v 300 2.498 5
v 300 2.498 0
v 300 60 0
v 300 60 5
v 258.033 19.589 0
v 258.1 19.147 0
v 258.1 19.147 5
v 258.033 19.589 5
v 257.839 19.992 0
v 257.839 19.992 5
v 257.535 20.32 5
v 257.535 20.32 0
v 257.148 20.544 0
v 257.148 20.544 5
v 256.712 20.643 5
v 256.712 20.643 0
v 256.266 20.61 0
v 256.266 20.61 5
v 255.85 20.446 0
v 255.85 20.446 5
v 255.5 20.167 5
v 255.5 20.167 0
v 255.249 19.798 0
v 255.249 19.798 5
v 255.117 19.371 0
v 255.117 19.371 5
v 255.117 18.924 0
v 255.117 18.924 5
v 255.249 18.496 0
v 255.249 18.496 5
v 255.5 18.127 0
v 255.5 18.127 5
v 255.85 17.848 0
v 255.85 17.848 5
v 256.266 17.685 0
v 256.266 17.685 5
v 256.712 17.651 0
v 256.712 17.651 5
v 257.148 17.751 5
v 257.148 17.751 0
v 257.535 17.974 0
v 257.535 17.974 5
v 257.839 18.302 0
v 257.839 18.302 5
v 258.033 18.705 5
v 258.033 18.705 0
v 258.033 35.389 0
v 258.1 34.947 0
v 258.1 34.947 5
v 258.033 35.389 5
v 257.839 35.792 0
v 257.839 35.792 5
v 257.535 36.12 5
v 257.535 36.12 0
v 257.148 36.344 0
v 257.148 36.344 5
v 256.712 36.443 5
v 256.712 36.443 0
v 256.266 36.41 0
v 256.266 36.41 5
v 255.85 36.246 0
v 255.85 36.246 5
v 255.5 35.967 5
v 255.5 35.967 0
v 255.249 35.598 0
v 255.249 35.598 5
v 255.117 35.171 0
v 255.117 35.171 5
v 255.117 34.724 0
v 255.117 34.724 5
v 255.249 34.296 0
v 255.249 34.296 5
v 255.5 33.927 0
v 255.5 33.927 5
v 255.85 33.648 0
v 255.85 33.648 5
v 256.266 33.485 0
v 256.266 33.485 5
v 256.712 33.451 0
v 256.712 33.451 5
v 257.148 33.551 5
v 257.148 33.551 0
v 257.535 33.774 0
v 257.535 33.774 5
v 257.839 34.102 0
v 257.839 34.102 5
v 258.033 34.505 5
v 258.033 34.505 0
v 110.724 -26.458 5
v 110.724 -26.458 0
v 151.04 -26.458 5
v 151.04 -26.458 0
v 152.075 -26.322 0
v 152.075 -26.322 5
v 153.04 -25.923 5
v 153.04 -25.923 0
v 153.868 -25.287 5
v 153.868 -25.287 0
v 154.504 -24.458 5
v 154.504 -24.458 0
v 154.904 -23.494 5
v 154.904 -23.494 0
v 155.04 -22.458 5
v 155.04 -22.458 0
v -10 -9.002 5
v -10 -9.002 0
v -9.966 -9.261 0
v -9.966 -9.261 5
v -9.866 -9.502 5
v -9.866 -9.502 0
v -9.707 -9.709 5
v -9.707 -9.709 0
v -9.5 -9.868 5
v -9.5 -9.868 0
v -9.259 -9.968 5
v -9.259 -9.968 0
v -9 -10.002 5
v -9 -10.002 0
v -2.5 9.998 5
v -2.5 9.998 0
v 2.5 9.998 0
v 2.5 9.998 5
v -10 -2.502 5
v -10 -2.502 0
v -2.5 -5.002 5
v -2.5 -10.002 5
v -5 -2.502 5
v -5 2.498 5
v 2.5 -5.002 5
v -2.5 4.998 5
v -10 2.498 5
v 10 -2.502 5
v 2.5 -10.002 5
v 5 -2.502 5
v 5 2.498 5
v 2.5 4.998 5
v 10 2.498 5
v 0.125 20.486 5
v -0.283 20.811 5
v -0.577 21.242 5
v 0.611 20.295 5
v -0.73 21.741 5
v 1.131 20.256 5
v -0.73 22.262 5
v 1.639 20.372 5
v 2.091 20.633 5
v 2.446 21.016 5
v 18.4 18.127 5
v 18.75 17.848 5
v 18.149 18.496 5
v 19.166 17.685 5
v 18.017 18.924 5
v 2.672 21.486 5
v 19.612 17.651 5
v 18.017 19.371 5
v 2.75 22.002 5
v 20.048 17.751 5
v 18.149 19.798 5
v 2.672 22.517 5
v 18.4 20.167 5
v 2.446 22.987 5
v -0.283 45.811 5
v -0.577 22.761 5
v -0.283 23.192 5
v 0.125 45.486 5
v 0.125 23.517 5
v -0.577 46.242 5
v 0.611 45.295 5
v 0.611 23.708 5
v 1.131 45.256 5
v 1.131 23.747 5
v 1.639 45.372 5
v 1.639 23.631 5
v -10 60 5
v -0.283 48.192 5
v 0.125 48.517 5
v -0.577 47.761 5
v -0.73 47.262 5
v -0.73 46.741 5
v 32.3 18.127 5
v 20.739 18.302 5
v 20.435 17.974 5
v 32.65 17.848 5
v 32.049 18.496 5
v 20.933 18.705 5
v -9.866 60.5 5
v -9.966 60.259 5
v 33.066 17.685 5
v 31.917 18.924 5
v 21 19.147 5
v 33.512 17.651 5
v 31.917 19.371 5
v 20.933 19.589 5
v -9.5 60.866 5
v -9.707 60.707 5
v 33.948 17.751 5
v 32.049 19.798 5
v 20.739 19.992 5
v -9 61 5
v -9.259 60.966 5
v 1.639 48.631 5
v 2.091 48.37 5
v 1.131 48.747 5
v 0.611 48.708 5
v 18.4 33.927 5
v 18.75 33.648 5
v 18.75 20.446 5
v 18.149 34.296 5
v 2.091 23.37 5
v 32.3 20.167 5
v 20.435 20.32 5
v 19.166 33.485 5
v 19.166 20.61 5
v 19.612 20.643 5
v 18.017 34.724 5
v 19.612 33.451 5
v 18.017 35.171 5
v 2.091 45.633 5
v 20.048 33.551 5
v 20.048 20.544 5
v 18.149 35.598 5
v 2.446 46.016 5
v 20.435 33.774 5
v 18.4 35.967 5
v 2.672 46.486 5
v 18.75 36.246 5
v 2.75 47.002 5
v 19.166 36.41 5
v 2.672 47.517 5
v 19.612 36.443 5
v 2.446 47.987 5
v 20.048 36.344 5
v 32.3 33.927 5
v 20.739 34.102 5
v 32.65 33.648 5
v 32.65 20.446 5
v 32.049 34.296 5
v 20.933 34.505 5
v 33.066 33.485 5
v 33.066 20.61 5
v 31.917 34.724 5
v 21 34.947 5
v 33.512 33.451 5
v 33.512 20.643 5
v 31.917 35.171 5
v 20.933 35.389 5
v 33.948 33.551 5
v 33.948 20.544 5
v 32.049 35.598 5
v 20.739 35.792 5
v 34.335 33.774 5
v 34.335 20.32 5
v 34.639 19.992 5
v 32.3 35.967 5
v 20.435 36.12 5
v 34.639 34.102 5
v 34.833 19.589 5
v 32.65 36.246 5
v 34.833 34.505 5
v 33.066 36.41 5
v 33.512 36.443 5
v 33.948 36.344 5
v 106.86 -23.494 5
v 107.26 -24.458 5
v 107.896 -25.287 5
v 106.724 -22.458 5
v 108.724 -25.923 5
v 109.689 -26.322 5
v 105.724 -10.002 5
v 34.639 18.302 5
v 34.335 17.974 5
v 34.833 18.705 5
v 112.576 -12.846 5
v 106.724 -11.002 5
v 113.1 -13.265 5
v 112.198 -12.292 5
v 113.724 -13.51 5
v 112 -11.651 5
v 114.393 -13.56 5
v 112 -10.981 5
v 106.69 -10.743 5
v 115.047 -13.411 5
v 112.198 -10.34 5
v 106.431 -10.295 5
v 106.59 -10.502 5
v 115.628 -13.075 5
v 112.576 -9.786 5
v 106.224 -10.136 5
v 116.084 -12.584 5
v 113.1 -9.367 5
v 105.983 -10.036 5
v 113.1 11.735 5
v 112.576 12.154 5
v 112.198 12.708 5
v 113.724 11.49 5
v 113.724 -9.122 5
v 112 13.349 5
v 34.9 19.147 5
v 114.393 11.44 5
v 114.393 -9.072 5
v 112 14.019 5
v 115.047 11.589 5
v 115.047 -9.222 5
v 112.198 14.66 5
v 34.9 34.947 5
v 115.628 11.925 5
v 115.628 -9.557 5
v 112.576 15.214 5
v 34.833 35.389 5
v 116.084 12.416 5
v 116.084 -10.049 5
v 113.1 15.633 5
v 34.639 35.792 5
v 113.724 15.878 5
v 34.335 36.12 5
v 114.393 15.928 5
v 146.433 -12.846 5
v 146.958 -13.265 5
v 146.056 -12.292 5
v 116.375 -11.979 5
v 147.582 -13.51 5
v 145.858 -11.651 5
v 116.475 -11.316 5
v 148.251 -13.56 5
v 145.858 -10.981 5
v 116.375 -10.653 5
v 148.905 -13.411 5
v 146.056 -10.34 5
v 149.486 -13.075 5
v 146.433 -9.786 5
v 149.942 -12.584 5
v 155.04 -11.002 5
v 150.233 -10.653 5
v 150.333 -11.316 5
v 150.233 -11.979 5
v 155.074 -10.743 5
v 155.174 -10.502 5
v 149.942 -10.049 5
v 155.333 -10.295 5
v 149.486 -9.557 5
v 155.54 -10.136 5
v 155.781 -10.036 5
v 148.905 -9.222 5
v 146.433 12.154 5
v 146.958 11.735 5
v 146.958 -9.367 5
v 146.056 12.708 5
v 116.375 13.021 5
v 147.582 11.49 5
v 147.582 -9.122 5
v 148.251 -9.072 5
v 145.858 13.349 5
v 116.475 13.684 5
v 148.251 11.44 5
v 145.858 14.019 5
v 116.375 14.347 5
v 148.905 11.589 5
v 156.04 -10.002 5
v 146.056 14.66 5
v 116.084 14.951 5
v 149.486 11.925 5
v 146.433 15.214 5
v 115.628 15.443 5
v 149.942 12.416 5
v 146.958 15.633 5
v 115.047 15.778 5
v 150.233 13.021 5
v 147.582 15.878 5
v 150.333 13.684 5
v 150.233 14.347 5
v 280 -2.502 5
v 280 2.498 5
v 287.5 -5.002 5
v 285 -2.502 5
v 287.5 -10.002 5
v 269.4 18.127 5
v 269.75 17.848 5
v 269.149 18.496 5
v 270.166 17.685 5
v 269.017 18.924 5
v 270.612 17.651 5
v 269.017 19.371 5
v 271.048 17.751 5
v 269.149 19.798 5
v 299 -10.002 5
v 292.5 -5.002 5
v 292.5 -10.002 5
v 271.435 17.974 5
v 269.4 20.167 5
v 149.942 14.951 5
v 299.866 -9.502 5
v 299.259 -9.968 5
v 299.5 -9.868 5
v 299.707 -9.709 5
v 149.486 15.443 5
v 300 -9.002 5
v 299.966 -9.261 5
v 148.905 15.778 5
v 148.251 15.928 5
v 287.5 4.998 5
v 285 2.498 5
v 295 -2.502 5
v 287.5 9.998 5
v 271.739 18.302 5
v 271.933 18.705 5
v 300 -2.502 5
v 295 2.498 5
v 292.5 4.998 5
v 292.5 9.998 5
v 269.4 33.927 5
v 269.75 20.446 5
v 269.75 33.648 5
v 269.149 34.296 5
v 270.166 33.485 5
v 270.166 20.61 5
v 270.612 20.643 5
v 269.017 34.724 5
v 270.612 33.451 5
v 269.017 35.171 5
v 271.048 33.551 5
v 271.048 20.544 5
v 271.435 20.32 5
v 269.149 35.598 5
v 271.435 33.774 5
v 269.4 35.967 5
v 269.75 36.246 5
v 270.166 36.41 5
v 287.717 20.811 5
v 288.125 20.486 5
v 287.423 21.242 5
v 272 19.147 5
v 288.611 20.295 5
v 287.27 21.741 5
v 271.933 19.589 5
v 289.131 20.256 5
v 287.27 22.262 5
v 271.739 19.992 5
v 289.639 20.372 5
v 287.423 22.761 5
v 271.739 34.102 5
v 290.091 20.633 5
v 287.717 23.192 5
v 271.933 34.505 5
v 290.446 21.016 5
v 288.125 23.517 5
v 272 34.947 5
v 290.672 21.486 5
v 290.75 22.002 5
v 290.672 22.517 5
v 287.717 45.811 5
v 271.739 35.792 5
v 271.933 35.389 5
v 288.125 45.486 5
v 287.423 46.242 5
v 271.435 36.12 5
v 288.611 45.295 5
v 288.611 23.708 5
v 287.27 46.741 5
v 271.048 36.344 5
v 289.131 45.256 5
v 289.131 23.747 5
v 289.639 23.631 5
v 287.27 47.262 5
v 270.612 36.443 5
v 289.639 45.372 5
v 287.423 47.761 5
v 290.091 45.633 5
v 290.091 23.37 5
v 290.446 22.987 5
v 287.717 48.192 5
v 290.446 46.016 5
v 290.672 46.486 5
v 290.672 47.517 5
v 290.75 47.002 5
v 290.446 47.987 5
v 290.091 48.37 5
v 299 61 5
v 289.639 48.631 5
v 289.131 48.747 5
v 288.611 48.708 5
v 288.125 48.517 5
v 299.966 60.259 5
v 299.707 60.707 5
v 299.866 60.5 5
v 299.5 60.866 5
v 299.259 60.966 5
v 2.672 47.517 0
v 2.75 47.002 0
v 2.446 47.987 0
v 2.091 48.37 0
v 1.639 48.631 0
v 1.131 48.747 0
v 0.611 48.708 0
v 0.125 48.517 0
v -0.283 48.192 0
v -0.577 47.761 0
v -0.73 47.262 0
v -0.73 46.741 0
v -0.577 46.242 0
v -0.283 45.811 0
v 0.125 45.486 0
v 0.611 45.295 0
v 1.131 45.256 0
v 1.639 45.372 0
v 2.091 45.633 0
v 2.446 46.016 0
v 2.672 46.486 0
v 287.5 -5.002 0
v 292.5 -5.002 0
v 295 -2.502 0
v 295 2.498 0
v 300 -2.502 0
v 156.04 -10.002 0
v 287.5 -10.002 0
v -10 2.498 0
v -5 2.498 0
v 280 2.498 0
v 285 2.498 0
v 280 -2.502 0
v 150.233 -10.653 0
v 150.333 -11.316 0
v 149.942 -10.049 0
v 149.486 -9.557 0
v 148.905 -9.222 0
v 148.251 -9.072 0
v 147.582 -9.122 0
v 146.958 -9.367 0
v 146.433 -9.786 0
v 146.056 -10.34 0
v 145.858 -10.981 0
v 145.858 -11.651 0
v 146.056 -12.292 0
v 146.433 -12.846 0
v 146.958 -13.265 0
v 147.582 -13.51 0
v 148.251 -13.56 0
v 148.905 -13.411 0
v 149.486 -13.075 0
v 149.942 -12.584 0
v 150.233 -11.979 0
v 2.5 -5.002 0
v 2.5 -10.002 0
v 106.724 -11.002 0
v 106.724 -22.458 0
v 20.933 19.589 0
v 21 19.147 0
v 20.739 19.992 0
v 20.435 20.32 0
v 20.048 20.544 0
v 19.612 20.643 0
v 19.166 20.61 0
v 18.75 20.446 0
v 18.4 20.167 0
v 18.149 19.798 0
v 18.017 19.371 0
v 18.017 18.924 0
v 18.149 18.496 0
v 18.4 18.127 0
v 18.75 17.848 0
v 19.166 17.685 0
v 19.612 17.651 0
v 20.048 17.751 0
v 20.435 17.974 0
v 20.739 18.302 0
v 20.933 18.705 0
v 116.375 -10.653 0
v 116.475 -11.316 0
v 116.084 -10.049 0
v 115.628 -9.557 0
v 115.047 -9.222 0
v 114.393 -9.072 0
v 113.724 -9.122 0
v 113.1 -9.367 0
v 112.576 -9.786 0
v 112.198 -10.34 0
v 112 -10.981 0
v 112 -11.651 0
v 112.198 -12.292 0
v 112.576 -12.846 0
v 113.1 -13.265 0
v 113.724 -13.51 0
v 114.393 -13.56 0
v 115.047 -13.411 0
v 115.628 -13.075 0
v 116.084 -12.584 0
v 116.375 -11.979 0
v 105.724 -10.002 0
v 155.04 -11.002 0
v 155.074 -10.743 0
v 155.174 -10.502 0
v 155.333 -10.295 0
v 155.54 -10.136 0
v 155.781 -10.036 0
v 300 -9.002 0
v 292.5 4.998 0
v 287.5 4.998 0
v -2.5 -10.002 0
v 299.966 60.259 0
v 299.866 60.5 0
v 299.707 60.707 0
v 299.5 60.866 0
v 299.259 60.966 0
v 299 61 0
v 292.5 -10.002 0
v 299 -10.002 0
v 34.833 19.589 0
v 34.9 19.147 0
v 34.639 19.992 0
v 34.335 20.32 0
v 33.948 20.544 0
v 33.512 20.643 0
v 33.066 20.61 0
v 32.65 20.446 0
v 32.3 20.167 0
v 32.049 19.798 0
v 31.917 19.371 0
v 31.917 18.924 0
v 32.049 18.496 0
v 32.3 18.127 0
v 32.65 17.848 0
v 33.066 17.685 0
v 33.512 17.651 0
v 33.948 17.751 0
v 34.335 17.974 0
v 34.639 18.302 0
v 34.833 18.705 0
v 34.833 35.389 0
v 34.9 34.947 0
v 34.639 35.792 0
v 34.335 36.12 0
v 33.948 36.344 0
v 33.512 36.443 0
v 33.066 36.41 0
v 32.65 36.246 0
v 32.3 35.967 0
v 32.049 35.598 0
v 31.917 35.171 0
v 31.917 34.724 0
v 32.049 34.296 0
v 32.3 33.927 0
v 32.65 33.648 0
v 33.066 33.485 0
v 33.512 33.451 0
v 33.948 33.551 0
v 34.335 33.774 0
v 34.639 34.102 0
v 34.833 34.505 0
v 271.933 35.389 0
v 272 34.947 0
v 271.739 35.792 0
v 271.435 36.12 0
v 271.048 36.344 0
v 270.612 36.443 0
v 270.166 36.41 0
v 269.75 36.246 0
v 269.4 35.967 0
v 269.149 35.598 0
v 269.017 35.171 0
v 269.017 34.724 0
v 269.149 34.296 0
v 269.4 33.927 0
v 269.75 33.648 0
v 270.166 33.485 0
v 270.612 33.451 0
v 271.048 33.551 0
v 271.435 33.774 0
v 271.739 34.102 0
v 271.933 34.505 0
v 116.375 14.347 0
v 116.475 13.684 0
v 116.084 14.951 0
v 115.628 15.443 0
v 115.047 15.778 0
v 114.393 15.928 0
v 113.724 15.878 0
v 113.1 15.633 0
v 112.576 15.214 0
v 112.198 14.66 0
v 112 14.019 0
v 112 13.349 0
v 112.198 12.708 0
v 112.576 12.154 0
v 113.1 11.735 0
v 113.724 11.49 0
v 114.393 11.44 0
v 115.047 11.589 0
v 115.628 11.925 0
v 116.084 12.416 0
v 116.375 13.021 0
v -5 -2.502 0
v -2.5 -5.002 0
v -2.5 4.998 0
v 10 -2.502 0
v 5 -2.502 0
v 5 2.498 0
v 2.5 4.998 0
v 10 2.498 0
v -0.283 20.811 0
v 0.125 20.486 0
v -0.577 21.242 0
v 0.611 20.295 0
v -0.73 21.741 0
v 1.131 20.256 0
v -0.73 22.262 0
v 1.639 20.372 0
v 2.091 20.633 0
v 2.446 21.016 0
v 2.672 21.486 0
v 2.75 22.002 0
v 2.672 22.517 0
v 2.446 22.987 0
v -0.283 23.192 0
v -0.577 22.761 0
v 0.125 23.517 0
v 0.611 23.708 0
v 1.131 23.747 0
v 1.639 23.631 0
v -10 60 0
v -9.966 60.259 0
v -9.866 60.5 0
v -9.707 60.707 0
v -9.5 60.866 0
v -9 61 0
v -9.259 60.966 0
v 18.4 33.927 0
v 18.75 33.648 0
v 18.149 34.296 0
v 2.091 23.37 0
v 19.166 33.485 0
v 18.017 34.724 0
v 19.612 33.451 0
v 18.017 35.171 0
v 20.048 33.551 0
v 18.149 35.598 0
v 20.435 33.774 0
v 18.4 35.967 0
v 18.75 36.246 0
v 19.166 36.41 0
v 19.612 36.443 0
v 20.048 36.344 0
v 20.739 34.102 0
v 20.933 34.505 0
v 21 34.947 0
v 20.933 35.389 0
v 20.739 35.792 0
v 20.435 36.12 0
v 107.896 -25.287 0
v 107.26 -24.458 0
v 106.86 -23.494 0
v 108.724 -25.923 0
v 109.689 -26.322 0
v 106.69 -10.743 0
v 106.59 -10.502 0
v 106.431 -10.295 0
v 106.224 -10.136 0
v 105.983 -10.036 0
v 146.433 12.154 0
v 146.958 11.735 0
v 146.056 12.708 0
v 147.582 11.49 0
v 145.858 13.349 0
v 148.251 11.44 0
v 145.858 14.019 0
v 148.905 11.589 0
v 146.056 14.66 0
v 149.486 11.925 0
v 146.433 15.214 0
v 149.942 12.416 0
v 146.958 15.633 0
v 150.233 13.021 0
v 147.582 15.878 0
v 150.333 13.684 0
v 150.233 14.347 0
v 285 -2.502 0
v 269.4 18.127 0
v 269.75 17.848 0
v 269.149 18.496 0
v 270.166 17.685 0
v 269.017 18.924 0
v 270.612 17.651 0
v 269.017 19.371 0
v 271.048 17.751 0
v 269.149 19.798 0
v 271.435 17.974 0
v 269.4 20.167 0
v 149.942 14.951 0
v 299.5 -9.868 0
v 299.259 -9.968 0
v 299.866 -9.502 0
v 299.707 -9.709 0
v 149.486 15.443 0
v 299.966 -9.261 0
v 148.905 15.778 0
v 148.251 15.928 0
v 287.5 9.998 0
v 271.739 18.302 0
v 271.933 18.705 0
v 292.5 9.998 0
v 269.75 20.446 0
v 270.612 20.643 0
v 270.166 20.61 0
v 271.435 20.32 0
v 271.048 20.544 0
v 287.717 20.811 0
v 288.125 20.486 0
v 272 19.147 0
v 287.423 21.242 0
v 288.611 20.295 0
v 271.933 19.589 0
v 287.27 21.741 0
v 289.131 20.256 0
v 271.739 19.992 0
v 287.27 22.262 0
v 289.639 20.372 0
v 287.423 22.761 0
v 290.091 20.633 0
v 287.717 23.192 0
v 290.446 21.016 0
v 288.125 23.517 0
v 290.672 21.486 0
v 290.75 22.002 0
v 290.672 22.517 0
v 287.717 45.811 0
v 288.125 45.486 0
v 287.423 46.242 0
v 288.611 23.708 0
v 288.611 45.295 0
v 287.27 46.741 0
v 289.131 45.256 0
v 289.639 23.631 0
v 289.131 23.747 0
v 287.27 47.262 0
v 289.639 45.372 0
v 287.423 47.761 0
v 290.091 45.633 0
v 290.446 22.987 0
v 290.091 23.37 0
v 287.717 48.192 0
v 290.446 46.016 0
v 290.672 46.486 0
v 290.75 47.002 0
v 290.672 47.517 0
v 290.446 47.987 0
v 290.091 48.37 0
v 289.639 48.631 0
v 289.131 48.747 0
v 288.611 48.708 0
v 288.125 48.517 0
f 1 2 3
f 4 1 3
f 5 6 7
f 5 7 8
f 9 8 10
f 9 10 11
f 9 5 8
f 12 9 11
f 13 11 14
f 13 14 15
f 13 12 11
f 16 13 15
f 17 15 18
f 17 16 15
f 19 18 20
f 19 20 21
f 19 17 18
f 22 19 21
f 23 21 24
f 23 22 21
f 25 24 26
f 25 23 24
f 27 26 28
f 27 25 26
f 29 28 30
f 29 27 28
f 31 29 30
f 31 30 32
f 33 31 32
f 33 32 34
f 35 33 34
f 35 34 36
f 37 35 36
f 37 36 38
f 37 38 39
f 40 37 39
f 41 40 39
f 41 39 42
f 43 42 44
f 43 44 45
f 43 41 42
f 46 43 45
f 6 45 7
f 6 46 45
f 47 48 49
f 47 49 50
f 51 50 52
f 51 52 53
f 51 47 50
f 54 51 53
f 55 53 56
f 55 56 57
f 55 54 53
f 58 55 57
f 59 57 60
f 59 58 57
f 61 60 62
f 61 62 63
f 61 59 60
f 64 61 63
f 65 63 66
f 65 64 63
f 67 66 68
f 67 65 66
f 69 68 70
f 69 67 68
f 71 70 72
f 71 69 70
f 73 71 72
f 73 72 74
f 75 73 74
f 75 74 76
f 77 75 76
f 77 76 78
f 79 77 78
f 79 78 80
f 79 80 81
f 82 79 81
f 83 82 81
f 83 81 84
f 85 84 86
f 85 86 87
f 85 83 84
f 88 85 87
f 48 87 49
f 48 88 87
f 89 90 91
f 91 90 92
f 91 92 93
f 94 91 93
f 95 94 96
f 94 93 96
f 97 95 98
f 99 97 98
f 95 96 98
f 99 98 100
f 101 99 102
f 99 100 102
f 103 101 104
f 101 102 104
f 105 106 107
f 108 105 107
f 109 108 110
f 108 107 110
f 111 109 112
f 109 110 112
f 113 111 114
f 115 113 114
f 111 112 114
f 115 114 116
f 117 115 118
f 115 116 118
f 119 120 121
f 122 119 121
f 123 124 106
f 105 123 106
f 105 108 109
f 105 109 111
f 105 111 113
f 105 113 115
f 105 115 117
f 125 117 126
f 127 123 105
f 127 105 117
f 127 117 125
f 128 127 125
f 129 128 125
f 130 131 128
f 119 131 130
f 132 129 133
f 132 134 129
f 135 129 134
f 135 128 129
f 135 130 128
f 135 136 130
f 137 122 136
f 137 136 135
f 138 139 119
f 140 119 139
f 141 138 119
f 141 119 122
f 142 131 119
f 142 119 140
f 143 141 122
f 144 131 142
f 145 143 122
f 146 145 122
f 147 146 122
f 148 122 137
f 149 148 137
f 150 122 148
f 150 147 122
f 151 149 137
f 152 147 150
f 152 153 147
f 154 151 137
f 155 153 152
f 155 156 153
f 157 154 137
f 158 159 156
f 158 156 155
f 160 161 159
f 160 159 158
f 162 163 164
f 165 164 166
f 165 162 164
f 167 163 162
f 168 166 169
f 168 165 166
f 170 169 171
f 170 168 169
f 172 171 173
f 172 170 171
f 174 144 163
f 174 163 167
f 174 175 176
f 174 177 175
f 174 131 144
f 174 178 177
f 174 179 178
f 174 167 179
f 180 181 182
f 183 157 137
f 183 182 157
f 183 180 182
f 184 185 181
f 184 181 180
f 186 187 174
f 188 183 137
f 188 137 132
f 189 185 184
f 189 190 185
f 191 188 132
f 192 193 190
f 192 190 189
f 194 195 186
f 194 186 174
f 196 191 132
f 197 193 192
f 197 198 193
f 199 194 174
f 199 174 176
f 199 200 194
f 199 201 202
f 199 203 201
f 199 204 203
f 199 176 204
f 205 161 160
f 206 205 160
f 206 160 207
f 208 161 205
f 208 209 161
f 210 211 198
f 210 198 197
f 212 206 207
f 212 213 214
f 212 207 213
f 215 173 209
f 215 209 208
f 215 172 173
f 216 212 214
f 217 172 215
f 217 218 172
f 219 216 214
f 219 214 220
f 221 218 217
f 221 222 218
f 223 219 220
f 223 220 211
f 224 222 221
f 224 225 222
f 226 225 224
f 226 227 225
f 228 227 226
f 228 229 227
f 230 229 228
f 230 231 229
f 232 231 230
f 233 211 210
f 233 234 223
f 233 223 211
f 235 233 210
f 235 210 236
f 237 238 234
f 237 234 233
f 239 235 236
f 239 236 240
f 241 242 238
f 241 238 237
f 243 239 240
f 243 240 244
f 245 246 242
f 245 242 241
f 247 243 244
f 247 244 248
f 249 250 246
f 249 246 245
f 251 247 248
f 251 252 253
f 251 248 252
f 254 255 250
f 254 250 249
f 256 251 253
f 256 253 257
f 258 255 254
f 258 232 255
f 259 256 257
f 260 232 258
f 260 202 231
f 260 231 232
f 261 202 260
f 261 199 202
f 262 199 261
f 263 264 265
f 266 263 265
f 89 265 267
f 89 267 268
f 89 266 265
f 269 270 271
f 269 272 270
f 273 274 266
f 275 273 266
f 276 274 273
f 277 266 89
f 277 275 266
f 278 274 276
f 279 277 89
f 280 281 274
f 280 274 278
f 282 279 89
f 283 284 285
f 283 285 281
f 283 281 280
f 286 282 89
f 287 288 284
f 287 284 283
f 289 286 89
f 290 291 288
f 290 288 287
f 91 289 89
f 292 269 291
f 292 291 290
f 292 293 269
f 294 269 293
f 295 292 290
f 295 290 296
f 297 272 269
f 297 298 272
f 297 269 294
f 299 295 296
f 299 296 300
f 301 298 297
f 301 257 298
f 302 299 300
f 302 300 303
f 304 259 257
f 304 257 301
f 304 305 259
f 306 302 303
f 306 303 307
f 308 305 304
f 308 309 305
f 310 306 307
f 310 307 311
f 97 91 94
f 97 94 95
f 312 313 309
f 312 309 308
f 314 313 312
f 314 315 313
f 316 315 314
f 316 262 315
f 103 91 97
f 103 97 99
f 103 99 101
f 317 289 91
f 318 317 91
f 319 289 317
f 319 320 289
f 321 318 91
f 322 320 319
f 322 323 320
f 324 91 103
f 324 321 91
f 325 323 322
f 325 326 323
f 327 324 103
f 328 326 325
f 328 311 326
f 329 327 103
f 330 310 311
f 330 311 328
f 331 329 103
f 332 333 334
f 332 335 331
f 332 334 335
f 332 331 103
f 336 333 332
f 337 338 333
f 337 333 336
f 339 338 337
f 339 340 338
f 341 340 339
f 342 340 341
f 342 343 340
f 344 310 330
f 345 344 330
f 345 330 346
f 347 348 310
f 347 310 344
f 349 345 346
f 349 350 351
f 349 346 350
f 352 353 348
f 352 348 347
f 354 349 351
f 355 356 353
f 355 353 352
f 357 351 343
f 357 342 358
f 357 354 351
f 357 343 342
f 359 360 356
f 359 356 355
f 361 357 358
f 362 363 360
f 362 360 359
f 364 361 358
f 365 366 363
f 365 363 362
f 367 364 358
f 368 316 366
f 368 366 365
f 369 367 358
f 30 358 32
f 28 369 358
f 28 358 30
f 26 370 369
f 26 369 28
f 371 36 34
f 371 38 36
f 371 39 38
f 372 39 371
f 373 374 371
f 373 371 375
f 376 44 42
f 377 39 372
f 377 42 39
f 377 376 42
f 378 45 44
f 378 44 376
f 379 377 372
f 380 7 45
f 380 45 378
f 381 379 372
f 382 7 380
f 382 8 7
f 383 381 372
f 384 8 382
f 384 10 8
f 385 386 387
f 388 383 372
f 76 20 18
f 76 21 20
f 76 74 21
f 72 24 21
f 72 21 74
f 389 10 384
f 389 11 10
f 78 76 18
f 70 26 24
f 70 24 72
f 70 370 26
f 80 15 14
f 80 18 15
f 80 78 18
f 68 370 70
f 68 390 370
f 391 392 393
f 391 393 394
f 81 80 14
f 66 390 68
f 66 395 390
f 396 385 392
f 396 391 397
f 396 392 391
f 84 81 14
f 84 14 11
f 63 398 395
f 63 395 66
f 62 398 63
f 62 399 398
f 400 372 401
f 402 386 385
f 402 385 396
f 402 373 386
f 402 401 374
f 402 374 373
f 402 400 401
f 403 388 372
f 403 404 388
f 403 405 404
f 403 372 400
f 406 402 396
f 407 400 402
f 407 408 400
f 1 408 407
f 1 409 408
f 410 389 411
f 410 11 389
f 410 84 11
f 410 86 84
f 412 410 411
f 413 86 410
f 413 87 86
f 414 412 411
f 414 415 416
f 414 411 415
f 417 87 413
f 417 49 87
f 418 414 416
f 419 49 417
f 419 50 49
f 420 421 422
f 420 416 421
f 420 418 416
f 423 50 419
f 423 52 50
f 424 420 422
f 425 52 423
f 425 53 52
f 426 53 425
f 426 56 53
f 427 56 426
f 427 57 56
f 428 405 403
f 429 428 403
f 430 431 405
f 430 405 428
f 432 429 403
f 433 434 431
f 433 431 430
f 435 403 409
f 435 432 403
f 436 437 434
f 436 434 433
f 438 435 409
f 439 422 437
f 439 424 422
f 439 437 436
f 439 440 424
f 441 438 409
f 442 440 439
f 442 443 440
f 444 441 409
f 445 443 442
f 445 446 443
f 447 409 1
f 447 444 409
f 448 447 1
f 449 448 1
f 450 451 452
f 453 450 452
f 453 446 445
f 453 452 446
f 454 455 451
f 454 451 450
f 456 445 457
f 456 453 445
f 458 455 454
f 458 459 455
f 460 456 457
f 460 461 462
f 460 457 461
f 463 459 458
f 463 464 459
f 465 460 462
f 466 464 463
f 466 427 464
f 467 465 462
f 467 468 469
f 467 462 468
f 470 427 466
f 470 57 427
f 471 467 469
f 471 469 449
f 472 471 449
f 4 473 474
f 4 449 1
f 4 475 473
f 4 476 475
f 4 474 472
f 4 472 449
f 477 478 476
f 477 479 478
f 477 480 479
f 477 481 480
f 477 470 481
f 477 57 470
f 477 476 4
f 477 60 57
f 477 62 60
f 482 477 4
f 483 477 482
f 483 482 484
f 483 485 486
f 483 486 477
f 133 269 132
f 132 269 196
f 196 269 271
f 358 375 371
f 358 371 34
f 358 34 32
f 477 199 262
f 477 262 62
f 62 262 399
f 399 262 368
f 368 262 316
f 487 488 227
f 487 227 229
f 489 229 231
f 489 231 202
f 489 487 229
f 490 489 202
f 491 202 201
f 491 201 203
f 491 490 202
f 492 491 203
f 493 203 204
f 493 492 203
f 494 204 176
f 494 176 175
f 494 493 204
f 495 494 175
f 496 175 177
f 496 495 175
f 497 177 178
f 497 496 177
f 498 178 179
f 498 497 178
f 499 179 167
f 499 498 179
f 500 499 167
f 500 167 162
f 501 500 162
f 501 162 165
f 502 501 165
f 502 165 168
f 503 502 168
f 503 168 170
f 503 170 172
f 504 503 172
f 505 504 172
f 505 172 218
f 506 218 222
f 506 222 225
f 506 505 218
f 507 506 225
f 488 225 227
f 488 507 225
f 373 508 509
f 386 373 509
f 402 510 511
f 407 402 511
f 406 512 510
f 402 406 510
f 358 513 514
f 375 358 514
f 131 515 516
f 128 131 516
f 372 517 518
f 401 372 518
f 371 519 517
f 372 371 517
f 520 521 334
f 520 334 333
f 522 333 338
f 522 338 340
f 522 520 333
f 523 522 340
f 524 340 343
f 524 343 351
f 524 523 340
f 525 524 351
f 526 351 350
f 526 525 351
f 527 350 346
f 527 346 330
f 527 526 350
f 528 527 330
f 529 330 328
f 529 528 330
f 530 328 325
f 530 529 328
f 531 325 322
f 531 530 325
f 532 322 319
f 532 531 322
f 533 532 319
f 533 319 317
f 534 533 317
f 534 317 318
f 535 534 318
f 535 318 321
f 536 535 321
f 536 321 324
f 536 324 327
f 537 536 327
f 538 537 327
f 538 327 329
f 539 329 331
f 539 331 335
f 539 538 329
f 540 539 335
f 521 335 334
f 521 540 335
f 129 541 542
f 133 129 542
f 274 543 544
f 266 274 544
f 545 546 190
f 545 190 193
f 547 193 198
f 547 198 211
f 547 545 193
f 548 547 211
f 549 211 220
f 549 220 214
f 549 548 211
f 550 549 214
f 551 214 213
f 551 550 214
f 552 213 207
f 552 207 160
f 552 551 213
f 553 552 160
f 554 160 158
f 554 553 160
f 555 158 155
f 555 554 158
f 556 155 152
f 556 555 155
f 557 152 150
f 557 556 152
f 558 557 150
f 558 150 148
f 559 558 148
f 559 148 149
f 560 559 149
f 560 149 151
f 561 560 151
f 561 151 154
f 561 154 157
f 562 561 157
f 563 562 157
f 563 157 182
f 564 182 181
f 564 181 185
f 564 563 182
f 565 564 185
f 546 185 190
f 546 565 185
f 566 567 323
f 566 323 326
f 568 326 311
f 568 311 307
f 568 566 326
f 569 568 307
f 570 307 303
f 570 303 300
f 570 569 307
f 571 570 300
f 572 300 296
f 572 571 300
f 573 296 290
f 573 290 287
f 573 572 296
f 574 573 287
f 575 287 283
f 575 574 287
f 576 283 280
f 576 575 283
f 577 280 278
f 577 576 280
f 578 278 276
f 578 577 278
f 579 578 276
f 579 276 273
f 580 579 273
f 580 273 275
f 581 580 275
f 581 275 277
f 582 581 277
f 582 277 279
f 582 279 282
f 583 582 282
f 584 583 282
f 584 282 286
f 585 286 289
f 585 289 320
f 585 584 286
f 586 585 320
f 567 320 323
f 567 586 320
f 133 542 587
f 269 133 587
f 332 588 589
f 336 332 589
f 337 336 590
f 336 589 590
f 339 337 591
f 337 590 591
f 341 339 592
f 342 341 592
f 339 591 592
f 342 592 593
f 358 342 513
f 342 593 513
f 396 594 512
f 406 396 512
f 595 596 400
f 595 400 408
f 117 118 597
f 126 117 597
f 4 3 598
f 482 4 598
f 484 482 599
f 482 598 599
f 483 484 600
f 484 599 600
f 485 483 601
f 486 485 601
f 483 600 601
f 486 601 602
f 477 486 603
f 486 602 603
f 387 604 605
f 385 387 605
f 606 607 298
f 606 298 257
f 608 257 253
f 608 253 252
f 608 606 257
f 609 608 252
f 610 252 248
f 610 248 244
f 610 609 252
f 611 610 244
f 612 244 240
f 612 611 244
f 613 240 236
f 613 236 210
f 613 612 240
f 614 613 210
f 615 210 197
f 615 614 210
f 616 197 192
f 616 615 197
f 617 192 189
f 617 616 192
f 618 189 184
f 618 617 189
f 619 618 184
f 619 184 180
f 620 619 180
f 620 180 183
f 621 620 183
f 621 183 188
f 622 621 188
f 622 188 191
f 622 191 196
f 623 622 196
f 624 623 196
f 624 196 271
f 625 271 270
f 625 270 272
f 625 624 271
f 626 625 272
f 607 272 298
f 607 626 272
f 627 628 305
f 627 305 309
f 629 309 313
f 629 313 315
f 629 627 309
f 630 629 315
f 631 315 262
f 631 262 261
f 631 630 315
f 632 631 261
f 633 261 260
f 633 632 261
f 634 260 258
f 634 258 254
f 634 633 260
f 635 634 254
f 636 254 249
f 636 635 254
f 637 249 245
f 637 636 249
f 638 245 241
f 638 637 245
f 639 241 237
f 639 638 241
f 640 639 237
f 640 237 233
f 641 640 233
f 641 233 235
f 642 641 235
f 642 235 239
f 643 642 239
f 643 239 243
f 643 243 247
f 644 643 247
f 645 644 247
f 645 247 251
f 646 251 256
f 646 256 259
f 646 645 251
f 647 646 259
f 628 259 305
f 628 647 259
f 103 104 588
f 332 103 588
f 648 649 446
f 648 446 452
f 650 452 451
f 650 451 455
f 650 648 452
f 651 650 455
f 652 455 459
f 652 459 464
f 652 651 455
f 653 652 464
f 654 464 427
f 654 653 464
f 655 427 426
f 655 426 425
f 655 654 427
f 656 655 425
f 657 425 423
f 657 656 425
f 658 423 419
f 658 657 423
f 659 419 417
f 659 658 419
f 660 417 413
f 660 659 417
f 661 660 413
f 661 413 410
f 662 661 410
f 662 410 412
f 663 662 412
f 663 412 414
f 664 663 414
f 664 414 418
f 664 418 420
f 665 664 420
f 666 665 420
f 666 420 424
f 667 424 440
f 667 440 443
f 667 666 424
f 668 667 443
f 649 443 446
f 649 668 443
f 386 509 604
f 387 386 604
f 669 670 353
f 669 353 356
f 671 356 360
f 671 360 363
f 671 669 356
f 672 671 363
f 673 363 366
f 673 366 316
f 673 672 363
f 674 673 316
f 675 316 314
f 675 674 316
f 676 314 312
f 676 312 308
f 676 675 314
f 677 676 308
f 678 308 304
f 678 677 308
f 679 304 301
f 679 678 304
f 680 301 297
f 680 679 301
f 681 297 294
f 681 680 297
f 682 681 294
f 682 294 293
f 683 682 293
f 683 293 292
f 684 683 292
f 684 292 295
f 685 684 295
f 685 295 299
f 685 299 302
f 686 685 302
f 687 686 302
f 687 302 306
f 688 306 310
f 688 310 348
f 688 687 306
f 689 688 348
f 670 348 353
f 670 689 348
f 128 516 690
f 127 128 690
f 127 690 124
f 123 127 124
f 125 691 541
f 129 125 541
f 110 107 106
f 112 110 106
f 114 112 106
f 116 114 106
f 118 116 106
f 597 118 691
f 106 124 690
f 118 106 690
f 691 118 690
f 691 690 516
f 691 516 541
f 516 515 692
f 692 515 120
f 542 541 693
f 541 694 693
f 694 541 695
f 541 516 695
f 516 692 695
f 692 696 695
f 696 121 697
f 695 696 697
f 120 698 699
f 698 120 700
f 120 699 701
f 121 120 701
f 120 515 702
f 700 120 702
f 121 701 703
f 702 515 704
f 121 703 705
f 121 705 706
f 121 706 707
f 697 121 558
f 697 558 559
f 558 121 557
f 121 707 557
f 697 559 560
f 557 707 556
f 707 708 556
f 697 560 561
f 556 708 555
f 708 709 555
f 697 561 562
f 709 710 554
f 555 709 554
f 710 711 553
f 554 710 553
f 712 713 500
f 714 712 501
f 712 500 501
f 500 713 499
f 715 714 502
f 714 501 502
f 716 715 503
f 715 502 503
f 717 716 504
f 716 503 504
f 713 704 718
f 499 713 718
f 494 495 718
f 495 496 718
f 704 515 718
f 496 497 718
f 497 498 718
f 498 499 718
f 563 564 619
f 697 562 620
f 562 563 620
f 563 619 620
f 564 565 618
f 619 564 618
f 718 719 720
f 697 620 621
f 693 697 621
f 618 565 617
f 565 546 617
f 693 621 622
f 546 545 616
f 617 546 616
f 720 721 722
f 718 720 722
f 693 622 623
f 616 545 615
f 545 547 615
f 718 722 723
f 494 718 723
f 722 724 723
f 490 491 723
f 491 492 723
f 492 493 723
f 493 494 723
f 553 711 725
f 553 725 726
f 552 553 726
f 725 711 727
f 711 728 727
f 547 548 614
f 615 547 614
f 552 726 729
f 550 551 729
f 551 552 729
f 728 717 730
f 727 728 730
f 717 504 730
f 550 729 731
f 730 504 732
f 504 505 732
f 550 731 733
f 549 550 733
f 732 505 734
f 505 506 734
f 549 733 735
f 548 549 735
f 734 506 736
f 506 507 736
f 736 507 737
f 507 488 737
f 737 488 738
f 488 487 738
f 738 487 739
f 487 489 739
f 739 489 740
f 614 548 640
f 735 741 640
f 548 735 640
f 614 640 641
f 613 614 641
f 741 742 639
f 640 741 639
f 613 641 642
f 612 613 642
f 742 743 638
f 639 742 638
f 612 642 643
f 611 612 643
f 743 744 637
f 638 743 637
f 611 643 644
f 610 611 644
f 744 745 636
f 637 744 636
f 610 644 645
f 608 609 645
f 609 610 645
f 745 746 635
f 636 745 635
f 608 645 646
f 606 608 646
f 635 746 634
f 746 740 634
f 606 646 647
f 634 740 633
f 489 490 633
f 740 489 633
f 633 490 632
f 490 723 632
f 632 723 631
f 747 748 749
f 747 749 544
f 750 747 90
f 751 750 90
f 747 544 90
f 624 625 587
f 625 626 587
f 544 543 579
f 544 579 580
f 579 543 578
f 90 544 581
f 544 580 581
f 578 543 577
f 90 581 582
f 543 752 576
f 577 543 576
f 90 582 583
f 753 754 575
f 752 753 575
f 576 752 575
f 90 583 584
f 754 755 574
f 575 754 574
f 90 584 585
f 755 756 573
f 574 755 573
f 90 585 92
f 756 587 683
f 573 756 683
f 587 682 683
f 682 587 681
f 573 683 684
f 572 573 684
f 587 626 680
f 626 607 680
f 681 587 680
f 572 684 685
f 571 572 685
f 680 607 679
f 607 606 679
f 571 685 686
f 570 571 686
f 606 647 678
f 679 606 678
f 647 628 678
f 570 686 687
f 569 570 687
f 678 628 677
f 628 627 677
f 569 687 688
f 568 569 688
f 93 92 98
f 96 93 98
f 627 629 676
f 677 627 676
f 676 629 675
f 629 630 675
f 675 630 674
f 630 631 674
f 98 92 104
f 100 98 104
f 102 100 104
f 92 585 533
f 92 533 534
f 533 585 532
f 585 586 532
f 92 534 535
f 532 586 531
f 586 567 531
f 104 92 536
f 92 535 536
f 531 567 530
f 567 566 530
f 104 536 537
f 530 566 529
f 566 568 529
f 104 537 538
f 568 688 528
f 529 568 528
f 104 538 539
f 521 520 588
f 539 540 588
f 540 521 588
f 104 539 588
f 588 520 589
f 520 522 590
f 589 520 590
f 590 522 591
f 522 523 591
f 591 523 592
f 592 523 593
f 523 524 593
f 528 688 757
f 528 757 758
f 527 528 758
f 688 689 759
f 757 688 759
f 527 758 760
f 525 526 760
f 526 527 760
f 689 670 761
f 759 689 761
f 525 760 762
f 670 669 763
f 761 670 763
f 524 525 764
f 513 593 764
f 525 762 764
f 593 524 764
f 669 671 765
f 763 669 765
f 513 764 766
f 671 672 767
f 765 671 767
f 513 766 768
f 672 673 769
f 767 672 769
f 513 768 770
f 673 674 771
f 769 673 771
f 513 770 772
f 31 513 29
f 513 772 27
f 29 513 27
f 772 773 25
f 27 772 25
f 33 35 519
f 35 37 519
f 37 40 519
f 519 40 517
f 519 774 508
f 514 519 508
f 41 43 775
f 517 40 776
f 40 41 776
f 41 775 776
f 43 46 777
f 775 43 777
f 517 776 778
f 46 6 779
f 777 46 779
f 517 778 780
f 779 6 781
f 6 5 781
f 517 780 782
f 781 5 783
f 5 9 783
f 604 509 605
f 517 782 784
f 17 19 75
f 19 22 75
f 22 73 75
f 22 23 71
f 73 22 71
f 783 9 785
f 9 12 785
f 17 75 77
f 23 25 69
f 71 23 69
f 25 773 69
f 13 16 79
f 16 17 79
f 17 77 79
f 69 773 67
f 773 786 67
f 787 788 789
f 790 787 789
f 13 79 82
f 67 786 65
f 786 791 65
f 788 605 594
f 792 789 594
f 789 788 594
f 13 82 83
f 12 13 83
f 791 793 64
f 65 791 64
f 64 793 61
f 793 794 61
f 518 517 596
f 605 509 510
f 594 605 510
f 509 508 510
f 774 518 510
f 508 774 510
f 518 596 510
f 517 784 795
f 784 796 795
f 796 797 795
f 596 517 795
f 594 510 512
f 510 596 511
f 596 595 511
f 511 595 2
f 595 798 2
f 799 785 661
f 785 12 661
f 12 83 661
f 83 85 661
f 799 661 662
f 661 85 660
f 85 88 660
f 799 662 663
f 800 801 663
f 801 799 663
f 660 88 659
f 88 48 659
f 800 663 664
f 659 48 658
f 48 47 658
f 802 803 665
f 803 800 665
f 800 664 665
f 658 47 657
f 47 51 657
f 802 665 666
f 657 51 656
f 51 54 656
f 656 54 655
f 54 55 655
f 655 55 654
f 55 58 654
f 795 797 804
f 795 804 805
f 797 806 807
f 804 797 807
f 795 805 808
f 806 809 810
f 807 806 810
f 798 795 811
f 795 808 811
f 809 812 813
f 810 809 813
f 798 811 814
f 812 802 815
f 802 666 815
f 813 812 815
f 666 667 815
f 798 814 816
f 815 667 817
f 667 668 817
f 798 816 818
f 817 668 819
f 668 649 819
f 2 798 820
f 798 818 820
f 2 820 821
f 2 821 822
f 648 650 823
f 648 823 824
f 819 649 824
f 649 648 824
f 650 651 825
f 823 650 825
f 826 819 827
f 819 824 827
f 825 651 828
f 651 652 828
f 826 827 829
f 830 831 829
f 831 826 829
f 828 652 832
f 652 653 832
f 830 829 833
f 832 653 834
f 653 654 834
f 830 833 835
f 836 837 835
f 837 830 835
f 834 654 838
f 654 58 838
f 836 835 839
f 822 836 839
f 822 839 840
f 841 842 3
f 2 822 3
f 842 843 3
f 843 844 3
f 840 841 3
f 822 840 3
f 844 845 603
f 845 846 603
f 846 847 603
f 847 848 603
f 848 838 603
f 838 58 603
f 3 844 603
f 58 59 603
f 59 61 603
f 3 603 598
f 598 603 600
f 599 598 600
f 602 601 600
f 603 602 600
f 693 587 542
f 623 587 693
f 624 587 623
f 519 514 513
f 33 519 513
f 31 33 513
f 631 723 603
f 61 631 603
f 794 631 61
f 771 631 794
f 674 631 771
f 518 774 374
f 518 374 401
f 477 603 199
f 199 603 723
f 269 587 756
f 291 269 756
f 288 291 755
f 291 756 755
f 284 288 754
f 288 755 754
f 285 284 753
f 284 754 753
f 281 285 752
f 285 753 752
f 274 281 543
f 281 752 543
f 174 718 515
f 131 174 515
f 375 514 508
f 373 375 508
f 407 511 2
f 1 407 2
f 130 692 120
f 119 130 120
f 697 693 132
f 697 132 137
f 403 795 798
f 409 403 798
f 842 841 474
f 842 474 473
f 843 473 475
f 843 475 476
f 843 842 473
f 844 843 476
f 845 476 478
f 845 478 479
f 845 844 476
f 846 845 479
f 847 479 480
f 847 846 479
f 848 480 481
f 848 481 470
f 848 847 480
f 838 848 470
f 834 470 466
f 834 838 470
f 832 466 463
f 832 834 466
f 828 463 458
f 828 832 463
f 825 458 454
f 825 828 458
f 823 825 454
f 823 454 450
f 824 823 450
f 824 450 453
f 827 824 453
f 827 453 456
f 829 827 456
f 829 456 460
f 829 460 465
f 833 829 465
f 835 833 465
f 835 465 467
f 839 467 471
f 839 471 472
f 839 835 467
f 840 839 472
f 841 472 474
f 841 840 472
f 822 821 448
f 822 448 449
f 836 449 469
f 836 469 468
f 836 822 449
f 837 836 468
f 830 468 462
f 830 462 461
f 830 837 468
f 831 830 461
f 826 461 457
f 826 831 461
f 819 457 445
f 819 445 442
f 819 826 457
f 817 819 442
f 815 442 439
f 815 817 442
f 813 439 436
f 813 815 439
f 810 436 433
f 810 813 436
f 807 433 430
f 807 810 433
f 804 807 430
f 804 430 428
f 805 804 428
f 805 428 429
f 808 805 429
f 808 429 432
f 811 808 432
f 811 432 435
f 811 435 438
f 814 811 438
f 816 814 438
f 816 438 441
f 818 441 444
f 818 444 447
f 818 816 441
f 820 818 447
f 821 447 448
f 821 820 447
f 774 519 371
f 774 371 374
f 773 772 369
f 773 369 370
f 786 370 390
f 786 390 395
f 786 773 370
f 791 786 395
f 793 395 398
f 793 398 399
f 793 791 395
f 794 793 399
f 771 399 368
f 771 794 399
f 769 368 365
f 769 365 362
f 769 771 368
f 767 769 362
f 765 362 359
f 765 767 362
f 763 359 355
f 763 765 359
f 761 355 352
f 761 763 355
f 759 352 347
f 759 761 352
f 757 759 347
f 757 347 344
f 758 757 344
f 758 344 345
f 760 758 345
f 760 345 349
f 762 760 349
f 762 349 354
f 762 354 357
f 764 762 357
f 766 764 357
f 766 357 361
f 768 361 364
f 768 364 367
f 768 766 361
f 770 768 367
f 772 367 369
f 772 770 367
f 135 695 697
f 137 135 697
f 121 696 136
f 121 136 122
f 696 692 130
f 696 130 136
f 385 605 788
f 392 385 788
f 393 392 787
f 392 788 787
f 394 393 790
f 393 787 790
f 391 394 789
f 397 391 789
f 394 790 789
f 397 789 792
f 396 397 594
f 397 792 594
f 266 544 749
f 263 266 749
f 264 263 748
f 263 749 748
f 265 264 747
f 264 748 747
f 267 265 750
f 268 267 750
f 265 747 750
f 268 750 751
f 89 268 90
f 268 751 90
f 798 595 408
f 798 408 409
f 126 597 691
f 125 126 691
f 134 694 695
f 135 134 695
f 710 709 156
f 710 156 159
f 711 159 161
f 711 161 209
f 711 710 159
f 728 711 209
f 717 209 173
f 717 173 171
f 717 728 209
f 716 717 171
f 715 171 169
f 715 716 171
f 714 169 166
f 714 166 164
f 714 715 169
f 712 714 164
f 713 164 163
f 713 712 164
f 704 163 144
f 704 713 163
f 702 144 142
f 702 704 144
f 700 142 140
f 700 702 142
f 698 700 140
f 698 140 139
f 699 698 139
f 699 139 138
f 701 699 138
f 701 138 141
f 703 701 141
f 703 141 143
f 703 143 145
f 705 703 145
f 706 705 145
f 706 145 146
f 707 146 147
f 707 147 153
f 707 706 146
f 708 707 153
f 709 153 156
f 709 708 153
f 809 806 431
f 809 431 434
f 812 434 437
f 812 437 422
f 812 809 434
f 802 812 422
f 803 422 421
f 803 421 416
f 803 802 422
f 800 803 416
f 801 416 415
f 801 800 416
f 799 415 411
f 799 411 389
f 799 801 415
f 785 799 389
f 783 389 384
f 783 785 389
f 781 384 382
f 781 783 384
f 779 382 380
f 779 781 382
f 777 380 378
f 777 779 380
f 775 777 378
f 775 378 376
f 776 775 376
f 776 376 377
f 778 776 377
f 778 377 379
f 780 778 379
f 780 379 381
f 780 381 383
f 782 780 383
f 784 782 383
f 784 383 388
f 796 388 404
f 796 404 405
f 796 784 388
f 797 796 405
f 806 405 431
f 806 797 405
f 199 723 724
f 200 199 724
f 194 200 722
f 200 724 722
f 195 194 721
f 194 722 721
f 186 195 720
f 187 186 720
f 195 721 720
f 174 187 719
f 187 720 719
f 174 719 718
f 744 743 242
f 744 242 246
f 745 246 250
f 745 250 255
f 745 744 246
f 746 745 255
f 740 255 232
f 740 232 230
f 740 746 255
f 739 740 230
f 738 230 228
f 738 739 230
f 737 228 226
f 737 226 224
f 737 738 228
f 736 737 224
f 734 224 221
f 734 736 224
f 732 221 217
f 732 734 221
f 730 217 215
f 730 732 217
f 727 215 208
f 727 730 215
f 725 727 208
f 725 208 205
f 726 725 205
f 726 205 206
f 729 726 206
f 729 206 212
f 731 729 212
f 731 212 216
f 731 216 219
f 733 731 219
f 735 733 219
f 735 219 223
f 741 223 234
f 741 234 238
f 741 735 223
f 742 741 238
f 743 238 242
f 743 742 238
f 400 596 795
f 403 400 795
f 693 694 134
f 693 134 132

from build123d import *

# Parameters (mm, degrees)
SKETCH1_R           = 1.5
SKETCH1_R_2         = 1.75
SKETCH1_R_3         = 2.25
SKETCH1_W           = 5
SKETCH1_H           = 5
BOSS_EXTRUDE1_DEPTH = 5


with BuildPart() as part:
    # Sketch1 → Boss-Extrude1 (new body)
    with BuildSketch(Plane.XY):
        with BuildLine():
            Line((-10, -2.501863855), (-10, -9.001863855))
            ThreePointArc((-10, -9.001863855), (-9.707106781, -9.708970637), (-9, -10.001863855))
            Line((-9, -10.001863855), (-2.5, -10.001863855))
            Line((-2.5, -10.001863855), (-2.5, -5.001863855))
            Line((-2.5, -5.001863855), (2.5, -5.001863855))
            Line((2.5, -5.001863855), (2.5, -10.001863855))
            Line((2.5, -10.001863855), (105.724043242, -10.001863855))
            ThreePointArc((105.724043242, -10.001863855), (106.431150023, -10.294757074), (106.724043242, -11.001863855))
            Line((106.724043242, -11.001863855), (106.724043242, -22.458474266))
            ThreePointArc((106.724043242, -22.458474266), (107.895616117, -25.286901391), (110.724043242, -26.458474266))
            Line((110.724043242, -26.458474266), (151.039811852, -26.458474266))
            ThreePointArc((151.039811852, -26.458474266), (153.868238976, -25.286901391), (155.039811852, -22.458474266))
            Line((155.039811852, -22.458474266), (155.039811852, -11.001863855))
            ThreePointArc((155.039811852, -11.001863855), (155.33270507, -10.294757074), (156.039811852, -10.001863855))
            Line((156.039811852, -10.001863855), (287.5, -10.001863855))
            Line((287.5, -10.001863855), (287.5, -5.001863855))
            Line((287.5, -5.001863855), (292.5, -5.001863855))
            Line((292.5, -5.001863855), (292.5, -10.001863855))
            Line((292.5, -10.001863855), (299, -10.001863855))
            ThreePointArc((299, -10.001863855), (299.707106781, -9.708970637), (300, -9.001863855))
            Line((300, -9.001863855), (300, -2.501863855))
            Line((300, -2.501863855), (295, -2.501863855))
            Line((295, -2.501863855), (295, 2.498136145))
            Line((295, 2.498136145), (300, 2.498136145))
            Line((300, 2.498136145), (300, 60))
            ThreePointArc((300, 60), (299.707106781, 60.707106781), (299, 61))
            Line((299, 61), (-9, 61))
            ThreePointArc((-9, 61), (-9.707106781, 60.707106781), (-10, 60))
            Line((-10, 60), (-10, 2.498136145))
            Line((-10, 2.498136145), (-5, 2.498136145))
            Line((-5, 2.498136145), (-5, -2.501863855))
            Line((-5, -2.501863855), (-10, -2.501863855))
        make_face()
        with Locations((33.4, 34.947207957)):
            Circle(SKETCH1_R, mode=Mode.SUBTRACT)
        with Locations((19.5, 34.947207957)):
            Circle(SKETCH1_R, mode=Mode.SUBTRACT)
        with Locations((256.6, 34.947207957)):
            Circle(SKETCH1_R, mode=Mode.SUBTRACT)
        with Locations((270.5, 34.947207957)):
            Circle(SKETCH1_R, mode=Mode.SUBTRACT)
        with Locations((270.5, 19.147207957)):
            Circle(SKETCH1_R, mode=Mode.SUBTRACT)
        with Locations((256.6, 19.147207957)):
            Circle(SKETCH1_R, mode=Mode.SUBTRACT)
        with Locations((289, 22.001504258)):
            Circle(SKETCH1_R_2, mode=Mode.SUBTRACT)
        with Locations((19.5, 19.147207957)):
            Circle(SKETCH1_R, mode=Mode.SUBTRACT)
        with Locations((148.082820817, 13.683948234)):
            Circle(SKETCH1_R_3, mode=Mode.SUBTRACT)
        with Locations((148.082820817, -11.316051766)):
            Circle(SKETCH1_R_3, mode=Mode.SUBTRACT)
        with Locations((289, 47.001504258)):
            Circle(SKETCH1_R_2, mode=Mode.SUBTRACT)
        with Locations((1, 22.001504258)):
            Circle(SKETCH1_R_2, mode=Mode.SUBTRACT)
        with Locations((1, 47.001504258)):
            Circle(SKETCH1_R_2, mode=Mode.SUBTRACT)
        with Locations((33.4, 19.147207957)):
            Circle(SKETCH1_R, mode=Mode.SUBTRACT)
        with Locations((114.224914373, -11.316051766)):
            Circle(SKETCH1_R_3, mode=Mode.SUBTRACT)
        with Locations((114.224914373, 13.683948234)):
            Circle(SKETCH1_R_3, mode=Mode.SUBTRACT)
        with Locations((0, 7.498136145)):
            Rectangle(SKETCH1_W, SKETCH1_H, mode=Mode.SUBTRACT)
        with Locations((7.5, -0.001863855)):
            Rectangle(SKETCH1_W, SKETCH1_H, mode=Mode.SUBTRACT)
        with Locations((282.5, -0.001863855)):
            Rectangle(SKETCH1_W, SKETCH1_H, mode=Mode.SUBTRACT)
        with Locations((290, 7.498136145)):
            Rectangle(SKETCH1_W, SKETCH1_H, mode=Mode.SUBTRACT)
    extrude(amount=BOSS_EXTRUDE1_DEPTH)


solid = part.part
